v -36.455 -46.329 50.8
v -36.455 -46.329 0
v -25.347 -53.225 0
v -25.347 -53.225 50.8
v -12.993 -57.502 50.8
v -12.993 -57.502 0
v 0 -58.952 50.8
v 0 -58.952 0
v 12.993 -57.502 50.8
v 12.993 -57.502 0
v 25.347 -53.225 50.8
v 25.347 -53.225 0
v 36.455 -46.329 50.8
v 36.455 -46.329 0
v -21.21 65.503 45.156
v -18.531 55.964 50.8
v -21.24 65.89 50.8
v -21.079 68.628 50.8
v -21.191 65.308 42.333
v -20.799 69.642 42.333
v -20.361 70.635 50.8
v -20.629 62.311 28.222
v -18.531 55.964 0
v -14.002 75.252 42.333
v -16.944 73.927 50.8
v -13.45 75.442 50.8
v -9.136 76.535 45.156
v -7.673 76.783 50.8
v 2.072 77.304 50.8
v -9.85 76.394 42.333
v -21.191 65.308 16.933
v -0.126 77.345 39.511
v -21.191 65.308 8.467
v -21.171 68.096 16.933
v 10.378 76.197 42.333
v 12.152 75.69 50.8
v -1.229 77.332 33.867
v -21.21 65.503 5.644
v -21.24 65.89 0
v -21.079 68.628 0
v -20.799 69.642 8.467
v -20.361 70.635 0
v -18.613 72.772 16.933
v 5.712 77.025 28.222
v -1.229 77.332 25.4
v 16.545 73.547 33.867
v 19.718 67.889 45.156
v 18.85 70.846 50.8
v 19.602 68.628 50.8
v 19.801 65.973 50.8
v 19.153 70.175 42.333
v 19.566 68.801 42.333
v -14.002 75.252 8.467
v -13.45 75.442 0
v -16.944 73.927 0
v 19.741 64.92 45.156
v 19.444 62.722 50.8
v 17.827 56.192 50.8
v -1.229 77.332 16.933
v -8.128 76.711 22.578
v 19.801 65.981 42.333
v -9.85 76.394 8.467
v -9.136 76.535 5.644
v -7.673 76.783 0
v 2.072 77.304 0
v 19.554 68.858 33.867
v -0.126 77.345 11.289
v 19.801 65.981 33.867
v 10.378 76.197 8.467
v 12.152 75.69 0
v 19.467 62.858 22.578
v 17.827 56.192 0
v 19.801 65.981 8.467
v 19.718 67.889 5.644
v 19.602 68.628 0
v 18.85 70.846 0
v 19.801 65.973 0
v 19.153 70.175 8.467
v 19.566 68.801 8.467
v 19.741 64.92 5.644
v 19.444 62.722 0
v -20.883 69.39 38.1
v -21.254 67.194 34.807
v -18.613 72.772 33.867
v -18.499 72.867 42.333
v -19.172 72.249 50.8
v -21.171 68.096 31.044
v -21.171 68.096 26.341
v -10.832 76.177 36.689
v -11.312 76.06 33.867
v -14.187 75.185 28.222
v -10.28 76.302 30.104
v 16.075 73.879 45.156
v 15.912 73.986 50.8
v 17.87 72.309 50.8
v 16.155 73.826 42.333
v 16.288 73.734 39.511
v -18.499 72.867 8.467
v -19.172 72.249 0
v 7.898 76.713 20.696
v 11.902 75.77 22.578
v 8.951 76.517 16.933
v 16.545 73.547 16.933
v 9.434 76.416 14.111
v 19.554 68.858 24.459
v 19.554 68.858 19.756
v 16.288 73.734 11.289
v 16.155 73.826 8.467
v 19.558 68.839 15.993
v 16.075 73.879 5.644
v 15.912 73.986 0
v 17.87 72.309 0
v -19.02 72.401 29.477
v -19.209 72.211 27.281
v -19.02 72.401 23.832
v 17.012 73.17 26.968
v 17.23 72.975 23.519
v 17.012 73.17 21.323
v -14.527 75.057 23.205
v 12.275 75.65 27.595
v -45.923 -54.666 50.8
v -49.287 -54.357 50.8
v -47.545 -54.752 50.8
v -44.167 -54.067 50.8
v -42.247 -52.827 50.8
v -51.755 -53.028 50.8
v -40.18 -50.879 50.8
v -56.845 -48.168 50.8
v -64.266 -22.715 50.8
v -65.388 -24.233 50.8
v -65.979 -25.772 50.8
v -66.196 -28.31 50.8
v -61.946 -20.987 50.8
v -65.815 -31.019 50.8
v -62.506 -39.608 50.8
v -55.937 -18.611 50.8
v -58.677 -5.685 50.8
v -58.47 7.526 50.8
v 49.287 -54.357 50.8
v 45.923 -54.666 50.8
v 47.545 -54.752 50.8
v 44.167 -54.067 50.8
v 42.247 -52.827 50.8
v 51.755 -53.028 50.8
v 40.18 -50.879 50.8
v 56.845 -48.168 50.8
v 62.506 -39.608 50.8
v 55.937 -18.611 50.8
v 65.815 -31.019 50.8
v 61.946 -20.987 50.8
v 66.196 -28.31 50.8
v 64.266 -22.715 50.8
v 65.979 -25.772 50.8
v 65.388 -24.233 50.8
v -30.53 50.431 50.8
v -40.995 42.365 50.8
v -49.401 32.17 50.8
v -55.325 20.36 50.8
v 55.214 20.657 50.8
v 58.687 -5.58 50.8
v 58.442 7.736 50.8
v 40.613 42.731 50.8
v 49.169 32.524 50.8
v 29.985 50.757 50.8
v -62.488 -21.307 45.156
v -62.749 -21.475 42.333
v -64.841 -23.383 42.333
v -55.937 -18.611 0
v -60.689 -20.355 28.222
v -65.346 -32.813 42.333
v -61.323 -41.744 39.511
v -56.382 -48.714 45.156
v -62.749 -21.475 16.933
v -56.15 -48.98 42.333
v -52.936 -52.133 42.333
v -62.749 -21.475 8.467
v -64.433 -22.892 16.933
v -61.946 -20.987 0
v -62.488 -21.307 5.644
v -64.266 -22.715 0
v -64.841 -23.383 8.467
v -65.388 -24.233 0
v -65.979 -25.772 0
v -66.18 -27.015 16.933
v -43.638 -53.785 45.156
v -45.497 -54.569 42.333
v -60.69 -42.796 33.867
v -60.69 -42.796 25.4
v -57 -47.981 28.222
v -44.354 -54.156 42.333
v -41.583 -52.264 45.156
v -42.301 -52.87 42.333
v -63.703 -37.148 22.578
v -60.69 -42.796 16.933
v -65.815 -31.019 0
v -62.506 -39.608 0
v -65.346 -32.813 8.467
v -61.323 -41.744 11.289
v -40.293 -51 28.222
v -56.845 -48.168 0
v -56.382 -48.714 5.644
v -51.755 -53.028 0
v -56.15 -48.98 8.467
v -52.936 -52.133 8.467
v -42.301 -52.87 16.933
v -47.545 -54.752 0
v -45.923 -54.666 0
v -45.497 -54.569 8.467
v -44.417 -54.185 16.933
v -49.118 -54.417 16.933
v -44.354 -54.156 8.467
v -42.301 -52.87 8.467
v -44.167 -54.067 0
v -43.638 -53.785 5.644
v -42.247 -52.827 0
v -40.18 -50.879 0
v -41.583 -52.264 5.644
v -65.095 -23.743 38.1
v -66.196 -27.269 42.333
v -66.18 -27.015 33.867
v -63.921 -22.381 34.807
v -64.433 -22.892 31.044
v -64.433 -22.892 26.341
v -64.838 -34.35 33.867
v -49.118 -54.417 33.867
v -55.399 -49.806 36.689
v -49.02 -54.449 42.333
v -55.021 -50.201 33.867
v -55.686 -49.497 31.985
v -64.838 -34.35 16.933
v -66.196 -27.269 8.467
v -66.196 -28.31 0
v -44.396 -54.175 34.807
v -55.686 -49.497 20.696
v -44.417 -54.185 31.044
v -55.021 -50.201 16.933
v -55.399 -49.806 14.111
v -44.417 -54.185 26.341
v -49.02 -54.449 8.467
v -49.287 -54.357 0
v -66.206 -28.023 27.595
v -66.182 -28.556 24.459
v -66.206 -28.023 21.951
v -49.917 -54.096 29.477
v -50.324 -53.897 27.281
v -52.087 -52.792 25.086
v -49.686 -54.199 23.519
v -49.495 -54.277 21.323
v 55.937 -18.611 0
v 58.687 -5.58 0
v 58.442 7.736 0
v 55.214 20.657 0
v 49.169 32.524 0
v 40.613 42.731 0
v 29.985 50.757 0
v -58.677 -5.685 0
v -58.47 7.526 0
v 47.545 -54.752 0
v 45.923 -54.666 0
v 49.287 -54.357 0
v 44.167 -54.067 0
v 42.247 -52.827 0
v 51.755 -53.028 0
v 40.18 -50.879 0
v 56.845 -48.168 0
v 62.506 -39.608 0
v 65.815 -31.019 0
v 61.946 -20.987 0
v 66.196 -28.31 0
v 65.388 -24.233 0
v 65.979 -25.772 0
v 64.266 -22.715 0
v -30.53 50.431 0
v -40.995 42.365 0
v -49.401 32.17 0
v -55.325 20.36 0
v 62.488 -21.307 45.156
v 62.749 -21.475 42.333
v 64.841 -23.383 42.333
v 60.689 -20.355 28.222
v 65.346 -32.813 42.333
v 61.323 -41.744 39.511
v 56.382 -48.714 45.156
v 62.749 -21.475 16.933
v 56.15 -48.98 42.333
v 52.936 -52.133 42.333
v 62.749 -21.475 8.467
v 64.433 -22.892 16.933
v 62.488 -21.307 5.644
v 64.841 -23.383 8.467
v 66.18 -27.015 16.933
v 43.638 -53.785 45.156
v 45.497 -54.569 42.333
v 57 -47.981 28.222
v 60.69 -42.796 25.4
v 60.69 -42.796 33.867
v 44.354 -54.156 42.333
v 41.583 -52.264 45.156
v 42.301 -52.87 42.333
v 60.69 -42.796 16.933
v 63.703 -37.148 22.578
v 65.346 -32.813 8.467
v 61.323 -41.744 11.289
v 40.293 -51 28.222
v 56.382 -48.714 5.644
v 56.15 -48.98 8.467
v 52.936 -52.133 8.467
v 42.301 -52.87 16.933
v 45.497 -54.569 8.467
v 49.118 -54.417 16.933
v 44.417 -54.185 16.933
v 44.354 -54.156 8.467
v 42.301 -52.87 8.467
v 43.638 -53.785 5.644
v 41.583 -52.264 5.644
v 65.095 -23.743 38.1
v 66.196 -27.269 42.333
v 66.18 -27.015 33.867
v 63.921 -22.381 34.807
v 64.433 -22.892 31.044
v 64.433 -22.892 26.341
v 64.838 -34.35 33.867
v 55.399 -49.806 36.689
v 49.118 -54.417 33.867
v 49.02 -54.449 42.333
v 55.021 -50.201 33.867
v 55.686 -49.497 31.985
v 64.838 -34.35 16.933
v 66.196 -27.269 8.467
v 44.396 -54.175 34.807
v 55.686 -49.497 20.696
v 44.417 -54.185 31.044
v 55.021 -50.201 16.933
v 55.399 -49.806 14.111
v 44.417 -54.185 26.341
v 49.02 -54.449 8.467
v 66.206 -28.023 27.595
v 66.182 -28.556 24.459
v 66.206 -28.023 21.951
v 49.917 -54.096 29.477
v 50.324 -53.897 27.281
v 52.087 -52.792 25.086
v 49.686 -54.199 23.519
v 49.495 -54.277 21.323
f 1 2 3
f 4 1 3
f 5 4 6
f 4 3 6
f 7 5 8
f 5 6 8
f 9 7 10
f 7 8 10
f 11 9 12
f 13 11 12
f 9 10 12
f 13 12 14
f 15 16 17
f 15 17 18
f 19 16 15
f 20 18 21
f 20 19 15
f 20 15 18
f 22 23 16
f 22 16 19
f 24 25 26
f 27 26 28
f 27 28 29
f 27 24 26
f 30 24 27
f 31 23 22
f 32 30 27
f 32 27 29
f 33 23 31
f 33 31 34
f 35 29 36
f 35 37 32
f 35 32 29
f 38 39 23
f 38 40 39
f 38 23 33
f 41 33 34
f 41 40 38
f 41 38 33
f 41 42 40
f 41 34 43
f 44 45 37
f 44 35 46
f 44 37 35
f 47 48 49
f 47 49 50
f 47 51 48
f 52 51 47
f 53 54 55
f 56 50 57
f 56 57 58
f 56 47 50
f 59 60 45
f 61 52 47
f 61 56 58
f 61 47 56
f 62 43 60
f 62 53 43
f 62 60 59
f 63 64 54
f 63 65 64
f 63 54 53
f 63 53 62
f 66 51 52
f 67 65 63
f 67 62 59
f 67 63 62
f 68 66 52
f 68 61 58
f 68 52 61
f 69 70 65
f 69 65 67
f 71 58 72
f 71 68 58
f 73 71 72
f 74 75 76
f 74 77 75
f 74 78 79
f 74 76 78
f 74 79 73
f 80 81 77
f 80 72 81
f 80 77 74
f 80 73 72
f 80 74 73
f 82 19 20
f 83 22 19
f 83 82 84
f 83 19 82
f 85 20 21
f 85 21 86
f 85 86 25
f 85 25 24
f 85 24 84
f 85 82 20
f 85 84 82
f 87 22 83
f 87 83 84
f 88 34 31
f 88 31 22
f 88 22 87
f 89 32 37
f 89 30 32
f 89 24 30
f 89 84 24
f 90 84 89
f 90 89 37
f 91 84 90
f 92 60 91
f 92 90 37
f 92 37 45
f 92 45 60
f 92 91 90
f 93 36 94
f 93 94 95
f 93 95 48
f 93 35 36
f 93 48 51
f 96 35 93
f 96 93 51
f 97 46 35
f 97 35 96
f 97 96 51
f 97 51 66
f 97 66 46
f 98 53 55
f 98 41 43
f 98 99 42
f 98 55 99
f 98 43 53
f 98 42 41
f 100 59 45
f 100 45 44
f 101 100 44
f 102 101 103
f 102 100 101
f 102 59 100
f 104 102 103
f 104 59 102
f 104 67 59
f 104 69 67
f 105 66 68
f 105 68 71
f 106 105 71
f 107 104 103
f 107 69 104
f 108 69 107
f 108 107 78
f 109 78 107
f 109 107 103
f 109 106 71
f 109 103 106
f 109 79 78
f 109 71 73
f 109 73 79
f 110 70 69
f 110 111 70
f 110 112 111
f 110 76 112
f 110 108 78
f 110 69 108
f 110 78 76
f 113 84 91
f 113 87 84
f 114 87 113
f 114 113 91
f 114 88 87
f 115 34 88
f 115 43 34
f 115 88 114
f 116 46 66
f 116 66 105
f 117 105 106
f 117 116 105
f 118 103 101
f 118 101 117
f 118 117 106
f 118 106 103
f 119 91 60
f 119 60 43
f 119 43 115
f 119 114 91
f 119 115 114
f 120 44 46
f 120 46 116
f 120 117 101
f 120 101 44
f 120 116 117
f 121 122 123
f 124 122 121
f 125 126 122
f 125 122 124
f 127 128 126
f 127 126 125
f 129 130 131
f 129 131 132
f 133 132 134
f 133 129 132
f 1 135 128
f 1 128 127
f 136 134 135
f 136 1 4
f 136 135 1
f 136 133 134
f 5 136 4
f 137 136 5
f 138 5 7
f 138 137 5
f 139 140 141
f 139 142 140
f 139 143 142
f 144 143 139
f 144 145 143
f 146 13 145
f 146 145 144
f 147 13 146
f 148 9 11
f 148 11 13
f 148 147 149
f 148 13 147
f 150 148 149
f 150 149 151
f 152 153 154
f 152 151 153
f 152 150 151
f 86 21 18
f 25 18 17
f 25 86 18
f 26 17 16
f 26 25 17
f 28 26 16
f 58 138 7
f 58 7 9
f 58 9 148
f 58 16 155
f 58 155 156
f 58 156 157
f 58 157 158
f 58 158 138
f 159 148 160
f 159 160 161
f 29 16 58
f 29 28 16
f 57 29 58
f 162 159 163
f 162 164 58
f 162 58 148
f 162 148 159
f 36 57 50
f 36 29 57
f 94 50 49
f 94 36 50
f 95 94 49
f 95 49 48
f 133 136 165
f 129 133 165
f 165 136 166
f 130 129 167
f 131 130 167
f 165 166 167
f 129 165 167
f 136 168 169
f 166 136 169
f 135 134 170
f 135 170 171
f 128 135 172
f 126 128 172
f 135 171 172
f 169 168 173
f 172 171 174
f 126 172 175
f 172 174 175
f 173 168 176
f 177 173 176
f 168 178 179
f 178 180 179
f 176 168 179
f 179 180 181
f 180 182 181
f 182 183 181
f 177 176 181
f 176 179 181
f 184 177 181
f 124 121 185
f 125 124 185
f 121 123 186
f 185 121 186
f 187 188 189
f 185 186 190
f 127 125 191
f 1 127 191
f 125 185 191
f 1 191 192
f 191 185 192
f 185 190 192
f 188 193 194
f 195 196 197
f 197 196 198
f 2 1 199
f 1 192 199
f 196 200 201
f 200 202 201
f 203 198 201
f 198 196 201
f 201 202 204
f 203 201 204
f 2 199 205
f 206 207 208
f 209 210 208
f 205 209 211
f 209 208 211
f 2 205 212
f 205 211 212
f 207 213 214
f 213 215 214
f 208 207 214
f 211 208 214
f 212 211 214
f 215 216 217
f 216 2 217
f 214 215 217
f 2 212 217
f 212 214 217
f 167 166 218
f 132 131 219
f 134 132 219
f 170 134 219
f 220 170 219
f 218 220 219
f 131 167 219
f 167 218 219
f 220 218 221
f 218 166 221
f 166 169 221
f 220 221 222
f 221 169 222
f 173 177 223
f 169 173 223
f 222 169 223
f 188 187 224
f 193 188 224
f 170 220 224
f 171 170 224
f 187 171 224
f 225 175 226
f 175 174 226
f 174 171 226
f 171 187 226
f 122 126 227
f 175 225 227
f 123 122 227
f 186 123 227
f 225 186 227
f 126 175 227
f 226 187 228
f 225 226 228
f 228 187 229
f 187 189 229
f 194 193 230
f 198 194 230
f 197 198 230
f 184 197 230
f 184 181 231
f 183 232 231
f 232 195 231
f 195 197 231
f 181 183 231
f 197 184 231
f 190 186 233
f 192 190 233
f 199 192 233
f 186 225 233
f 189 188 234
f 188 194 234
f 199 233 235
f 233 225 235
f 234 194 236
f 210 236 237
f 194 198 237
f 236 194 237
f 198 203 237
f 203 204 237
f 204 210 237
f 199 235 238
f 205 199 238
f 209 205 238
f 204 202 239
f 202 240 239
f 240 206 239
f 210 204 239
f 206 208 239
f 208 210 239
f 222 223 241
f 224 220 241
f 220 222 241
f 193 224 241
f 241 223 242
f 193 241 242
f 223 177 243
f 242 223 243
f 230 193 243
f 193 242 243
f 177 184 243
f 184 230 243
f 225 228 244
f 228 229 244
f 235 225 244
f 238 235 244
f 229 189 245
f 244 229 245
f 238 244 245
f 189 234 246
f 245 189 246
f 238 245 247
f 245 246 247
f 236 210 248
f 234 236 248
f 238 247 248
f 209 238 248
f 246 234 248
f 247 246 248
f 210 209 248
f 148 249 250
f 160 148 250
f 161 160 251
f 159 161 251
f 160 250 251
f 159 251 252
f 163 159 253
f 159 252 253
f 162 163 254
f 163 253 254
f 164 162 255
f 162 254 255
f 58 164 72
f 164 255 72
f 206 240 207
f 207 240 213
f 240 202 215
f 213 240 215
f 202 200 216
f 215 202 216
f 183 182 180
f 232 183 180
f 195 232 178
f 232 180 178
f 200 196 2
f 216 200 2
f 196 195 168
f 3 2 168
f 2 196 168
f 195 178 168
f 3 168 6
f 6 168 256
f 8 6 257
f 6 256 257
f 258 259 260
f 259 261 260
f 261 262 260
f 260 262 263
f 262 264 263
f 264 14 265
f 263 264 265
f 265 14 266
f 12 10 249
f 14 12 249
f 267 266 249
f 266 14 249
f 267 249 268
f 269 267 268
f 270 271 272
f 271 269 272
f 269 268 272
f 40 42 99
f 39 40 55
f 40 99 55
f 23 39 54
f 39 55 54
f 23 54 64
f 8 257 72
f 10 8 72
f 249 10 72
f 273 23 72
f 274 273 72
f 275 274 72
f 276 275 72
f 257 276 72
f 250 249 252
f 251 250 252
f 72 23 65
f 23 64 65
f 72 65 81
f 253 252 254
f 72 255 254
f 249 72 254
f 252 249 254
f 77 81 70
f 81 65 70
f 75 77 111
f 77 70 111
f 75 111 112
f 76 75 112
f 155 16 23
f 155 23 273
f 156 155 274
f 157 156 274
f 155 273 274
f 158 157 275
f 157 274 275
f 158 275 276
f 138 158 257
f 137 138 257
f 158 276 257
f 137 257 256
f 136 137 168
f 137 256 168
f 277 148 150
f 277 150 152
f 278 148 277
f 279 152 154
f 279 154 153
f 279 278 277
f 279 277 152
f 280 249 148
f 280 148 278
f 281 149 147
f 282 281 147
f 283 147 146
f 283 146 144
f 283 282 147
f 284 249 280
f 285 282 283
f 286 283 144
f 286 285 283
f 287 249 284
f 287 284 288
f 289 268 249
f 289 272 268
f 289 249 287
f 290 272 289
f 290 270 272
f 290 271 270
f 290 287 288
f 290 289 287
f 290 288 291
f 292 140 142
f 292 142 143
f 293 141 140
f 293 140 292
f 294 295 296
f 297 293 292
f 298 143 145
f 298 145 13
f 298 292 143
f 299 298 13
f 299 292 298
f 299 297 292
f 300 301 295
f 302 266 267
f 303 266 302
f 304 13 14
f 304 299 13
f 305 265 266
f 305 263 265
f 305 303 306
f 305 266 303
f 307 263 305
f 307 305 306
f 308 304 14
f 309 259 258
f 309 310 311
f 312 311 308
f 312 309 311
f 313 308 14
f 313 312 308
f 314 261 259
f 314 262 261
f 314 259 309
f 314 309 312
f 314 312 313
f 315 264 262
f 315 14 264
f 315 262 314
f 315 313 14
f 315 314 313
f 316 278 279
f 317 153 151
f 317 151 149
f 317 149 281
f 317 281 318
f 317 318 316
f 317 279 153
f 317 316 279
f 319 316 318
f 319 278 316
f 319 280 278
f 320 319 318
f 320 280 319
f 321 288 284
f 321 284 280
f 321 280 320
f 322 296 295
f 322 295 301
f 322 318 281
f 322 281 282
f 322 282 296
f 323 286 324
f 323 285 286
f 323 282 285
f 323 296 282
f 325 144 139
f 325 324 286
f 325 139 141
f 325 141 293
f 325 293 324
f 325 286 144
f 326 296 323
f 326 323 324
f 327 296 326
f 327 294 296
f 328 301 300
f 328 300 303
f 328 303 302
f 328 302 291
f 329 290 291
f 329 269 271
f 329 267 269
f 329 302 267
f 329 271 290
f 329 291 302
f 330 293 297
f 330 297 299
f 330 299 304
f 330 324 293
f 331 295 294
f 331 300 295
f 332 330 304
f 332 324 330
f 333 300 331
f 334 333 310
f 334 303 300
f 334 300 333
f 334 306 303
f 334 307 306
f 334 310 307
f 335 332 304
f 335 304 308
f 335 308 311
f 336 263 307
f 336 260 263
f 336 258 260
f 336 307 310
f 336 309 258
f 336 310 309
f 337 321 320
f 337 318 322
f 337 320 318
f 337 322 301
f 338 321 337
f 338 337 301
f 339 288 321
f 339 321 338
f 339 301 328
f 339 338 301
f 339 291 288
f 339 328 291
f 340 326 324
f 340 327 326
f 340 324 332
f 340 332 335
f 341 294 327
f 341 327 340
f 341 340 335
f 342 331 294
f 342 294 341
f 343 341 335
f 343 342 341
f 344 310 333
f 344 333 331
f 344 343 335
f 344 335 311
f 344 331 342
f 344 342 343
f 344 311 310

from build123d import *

# Parameters (mm, degrees)
F1_DEPTH = 50.8


with BuildPart() as f1:
    # F0 (on Top) → F1 (new body)
    with BuildSketch(Plane.XY):
        with BuildLine():
            add(Edge.make_bspline(
                [(-55.9372343089, -18.6110077969), (-60.8635430407, -20.2230194958), (-73.4053859661, -24.3510672229), (-49.5743515525, -63.3247808232), (-40.2484306998, -51.254227378), (-36.4546575654, -46.3292751415)],
                knots=[0, 0, 0, 0, 0.2757957407, 0.7062920031, 1, 1, 1, 1], degree=3))
            ThreePointArc((-36.4546575654, -46.3292751415), (0, -58.9520465577), (36.4546575654, -46.3292751415))
            add(Edge.make_bspline(
                [(55.9372343089, -18.6110077969), (60.8635430407, -20.2230194958), (73.4053859661, -24.3510672229), (49.5743515525, -63.3247808232), (40.2484306998, -51.254227378), (36.4546575654, -46.3292751415)],
                knots=[0, 0, 0, 0, 0.2757957407, 0.7062920031, 1, 1, 1, 1], degree=3))
            ThreePointArc((55.9372343089, -18.6110077969), (52.5276532647, 26.7617158615), (17.8266388345, 56.1921234801))
            add(Edge.make_bspline(
                [(-18.5308456371, 55.9638414811), (-20.8923301584, 62.4104470065), (-26.6259819502, 78.1207966464), (24.2945065208, 79.3302533373), (19.7307556094, 62.9747286546), (17.8266388345, 56.1921234801)],
                knots=[0, 0, 0, 0, 0.2886847661, 0.7062556792, 1, 1, 1, 1], degree=3))
            ThreePointArc((-18.5308456371, 55.9638414811), (-52.694646492, 26.4313833241), (-55.9372343089, -18.6110077969))
        make_face()
    extrude(amount=F1_DEPTH)


solid = f1.part
